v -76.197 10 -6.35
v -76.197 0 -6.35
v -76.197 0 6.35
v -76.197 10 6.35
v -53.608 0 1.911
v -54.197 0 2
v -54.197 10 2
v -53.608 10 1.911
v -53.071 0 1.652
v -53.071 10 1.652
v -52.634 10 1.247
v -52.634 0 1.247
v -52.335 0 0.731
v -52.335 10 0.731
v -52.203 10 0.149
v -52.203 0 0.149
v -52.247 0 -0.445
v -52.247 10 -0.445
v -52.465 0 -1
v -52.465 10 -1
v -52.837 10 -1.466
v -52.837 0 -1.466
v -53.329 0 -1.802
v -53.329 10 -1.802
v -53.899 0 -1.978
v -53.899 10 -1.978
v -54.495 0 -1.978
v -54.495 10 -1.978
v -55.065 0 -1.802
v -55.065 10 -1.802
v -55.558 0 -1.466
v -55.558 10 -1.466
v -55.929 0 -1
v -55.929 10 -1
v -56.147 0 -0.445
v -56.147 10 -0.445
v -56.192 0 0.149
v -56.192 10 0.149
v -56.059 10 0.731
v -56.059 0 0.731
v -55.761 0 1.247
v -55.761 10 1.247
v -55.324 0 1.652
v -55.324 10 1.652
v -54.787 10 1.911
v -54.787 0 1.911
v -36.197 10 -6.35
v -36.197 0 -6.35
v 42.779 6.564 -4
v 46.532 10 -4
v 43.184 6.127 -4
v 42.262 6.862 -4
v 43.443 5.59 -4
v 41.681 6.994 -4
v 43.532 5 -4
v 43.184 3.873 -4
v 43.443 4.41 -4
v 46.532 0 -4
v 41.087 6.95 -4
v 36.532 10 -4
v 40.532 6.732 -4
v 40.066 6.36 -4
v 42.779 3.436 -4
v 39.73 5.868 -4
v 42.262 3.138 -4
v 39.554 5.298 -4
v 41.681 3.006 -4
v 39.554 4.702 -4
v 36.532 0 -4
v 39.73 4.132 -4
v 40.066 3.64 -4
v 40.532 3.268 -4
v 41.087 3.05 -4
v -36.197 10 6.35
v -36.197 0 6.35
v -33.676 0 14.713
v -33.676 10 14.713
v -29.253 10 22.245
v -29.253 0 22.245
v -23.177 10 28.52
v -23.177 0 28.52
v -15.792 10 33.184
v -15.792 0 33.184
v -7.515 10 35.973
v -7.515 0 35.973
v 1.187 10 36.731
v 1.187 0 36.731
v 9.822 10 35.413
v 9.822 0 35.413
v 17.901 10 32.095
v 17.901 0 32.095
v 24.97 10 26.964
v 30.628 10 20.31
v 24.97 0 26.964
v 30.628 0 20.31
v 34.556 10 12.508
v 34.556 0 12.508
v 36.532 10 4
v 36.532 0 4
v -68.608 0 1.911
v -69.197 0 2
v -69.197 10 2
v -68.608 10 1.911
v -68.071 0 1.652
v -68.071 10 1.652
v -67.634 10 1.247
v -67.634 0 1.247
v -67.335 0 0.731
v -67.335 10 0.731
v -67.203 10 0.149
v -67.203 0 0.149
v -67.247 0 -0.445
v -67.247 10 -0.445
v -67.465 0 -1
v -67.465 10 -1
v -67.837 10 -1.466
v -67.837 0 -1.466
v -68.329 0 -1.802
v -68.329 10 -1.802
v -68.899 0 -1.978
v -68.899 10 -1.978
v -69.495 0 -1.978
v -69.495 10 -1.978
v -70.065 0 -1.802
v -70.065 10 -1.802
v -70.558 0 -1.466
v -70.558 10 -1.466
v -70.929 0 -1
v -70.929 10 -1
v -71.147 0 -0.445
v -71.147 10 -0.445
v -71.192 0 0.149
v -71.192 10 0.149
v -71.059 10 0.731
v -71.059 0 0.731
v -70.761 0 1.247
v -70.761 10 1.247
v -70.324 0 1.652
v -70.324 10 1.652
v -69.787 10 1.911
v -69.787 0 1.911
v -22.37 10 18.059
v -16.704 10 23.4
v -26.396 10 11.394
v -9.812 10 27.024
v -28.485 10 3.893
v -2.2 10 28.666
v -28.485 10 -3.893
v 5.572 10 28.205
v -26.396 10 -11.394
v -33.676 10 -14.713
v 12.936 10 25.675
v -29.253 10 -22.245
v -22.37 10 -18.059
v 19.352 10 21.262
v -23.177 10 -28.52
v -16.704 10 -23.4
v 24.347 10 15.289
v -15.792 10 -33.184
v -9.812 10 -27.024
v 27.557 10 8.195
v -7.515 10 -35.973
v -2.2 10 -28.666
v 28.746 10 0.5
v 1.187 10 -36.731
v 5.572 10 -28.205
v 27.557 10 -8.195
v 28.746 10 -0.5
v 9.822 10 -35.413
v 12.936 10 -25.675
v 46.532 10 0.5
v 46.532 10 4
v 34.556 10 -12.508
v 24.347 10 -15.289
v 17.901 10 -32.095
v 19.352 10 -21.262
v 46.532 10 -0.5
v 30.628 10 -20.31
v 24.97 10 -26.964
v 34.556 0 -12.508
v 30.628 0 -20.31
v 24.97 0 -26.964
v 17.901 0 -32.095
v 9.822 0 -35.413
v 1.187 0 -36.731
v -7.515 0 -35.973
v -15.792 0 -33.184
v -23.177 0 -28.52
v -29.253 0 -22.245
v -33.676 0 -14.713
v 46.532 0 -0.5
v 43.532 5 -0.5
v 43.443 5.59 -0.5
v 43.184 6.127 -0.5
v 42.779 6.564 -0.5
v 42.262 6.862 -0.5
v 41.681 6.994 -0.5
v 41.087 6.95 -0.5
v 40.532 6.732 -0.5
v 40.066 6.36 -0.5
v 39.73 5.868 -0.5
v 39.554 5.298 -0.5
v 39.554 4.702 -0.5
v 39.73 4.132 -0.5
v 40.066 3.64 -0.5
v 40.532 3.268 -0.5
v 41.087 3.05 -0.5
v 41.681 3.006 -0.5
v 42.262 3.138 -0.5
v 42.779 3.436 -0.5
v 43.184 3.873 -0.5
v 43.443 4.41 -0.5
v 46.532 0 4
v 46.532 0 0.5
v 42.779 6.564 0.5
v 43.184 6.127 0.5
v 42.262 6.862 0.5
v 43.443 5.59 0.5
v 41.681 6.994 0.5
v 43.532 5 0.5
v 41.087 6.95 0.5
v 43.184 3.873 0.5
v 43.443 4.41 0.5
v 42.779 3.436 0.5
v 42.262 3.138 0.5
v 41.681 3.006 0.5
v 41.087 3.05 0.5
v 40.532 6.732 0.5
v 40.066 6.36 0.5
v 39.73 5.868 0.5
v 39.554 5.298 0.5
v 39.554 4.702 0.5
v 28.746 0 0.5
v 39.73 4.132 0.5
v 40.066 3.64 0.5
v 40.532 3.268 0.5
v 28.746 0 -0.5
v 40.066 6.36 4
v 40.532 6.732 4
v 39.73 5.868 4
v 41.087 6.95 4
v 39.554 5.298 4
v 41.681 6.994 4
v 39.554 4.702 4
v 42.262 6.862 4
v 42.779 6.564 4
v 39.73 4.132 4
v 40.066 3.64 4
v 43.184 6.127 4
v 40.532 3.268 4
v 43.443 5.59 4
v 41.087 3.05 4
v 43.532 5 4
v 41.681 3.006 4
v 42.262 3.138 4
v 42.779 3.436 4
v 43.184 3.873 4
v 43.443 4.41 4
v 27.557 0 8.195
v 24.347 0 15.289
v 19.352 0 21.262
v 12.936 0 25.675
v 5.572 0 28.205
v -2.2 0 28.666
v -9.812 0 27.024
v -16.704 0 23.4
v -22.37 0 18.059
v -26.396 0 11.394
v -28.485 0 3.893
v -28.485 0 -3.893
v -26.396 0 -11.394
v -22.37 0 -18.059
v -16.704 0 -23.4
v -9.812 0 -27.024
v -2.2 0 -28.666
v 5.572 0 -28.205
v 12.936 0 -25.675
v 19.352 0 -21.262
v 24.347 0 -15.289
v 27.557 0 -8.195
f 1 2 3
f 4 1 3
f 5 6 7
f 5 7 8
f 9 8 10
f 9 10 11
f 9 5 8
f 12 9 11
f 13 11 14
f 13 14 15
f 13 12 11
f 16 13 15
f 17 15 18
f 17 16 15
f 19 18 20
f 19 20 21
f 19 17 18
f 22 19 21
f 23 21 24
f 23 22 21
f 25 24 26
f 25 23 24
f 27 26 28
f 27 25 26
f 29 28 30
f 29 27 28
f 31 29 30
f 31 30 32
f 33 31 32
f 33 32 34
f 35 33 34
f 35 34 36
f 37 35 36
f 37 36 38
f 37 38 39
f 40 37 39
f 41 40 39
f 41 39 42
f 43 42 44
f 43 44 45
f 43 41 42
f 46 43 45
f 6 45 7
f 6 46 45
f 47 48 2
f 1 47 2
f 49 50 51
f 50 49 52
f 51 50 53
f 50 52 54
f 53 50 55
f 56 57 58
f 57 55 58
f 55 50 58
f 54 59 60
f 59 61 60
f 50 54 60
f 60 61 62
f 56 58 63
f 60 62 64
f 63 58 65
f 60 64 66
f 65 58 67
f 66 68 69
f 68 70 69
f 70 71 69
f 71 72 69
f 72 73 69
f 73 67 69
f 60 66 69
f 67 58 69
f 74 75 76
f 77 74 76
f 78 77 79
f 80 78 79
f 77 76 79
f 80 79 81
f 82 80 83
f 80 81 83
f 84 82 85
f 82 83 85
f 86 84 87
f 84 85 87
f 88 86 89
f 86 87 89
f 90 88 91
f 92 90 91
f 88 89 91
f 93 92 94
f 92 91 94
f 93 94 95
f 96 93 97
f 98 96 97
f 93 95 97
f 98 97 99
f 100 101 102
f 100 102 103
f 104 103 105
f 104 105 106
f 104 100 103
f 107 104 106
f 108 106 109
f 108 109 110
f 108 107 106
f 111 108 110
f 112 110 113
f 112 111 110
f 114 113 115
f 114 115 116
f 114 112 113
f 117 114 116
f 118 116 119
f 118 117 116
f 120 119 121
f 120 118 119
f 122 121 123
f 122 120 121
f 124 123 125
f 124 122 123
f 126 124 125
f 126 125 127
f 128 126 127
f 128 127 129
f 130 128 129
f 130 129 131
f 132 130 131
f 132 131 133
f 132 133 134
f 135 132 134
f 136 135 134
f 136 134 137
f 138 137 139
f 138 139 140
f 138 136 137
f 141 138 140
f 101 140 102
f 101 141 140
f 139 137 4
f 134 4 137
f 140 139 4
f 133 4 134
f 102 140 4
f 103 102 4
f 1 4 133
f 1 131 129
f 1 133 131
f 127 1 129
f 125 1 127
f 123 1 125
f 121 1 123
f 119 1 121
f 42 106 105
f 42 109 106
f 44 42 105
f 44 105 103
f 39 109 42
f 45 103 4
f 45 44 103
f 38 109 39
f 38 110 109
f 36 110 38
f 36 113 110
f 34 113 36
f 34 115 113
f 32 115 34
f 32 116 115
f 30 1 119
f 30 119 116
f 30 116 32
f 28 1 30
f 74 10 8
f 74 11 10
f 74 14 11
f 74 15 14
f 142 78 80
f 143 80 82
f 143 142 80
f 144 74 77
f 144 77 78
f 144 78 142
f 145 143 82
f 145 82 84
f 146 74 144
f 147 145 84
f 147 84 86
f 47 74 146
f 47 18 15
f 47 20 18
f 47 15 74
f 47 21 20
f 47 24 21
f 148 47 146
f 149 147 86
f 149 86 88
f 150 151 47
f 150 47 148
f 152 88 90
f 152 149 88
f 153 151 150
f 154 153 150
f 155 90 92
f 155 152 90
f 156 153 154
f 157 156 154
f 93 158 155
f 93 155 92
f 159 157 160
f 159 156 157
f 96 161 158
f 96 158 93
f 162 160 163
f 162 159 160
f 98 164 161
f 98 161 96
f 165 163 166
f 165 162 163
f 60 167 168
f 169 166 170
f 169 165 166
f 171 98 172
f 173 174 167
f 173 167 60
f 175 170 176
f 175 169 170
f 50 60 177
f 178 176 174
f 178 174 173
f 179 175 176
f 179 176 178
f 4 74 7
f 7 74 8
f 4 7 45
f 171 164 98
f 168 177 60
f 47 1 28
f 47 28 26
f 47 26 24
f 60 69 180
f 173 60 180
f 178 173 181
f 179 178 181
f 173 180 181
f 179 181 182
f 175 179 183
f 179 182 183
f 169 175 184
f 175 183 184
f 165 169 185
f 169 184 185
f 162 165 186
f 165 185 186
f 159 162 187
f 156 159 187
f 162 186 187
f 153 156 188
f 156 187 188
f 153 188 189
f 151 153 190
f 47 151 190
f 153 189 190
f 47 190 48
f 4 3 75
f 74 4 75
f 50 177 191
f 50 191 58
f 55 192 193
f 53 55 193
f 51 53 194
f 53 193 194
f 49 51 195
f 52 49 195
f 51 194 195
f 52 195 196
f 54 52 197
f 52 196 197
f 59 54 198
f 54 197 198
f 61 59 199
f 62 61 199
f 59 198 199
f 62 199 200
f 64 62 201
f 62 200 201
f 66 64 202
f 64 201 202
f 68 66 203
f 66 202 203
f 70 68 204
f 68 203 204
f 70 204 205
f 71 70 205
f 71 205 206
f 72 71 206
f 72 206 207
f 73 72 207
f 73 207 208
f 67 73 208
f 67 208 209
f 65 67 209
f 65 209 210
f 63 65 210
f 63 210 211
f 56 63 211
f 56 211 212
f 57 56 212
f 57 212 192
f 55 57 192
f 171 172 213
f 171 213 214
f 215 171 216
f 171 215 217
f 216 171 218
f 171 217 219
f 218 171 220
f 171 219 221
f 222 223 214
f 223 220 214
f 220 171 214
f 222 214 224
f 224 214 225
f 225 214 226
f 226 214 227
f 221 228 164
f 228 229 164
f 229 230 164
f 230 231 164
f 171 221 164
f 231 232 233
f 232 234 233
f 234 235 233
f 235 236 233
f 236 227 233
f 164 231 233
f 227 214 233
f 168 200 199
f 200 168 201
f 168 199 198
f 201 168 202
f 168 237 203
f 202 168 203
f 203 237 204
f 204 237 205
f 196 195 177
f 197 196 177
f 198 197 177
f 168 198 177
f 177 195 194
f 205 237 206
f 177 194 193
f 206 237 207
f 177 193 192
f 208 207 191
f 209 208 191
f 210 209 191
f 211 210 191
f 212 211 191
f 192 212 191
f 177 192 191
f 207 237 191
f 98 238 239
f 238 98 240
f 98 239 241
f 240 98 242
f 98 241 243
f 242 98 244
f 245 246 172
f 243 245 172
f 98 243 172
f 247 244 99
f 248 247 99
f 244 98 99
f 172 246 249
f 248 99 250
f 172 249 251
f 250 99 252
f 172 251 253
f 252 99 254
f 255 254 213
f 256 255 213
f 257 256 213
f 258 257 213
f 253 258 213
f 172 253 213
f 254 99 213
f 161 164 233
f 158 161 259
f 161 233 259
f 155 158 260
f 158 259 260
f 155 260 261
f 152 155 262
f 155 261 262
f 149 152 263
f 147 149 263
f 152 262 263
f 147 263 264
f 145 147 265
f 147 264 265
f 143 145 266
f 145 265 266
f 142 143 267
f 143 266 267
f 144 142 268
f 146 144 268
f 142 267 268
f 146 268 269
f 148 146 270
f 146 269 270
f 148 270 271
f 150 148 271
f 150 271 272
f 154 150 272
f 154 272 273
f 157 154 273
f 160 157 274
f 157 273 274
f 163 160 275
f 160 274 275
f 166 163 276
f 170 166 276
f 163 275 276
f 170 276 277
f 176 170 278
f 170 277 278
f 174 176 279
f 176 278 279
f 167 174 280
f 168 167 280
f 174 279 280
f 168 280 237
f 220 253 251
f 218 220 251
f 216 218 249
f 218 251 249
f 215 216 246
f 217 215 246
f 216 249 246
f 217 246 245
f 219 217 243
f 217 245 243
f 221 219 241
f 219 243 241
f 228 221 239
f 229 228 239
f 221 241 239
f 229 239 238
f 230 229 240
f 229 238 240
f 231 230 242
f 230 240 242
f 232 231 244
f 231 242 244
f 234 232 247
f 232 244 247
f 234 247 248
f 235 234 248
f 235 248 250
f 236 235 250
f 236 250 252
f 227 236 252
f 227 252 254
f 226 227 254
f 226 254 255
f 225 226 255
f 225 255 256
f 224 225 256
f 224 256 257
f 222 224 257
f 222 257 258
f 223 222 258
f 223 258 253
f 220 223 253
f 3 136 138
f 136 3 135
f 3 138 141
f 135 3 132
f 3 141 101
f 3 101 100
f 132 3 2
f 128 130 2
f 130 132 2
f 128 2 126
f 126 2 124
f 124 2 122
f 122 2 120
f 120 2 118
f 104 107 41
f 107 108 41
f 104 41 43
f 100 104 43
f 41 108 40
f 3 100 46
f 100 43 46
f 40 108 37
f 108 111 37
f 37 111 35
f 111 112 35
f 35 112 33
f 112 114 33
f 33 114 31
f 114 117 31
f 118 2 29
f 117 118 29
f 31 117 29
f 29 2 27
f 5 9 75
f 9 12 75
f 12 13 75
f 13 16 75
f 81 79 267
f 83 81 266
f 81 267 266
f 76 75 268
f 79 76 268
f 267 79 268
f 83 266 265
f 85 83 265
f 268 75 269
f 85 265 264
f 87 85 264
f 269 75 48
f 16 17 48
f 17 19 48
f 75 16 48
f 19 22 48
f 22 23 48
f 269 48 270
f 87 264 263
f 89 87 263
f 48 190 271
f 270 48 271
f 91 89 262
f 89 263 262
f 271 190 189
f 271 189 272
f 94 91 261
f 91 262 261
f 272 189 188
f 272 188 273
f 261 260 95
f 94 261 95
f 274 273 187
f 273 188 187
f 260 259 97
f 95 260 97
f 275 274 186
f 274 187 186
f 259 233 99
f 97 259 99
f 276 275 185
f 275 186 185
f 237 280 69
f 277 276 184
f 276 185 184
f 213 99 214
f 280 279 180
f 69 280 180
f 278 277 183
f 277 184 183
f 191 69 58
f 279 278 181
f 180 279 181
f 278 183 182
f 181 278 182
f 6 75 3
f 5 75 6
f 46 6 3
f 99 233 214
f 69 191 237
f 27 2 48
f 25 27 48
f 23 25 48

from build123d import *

# Parameters (mm, degrees)
SKETCH1_R           = 2
BOSS_EXTRUDE2_DEPTH = 10
SKETCH2_R           = 2
CUT_EXTRUDE1_DEPTH  = 87.986099448


with BuildPart() as part:
    # Sketch1 → Boss-Extrude2 (new body)
    with BuildSketch(Plane(origin=(0, 0, 0), x_dir=(1, 0, 0), z_dir=(0, 1, 0))):
        with BuildLine():
            Line((-76.197237464, -6.35), (-36.197237464, -6.35))
            ThreePointArc((-36.197237464, -6.35), (1.186838378, -36.730830574), (36.531664348, -4))
            Line((36.531664348, -4), (46.531664348, -4))
            Line((46.531664348, -4), (46.531664348, -0.5))
            Line((46.531664348, -0.5), (28.745651845, -0.5))
            ThreePointArc((28.745651845, -0.5), (-28.75, 0), (28.745651845, 0.5))
            Line((28.745651845, 0.5), (46.531664348, 0.5))
            Line((46.531664348, 0.5), (46.531664348, 4))
            Line((46.531664348, 4), (36.531664348, 4))
            ThreePointArc((36.531664348, 4), (1.186838378, 36.730830574), (-36.197237464, 6.35))
            Line((-36.197237464, 6.35), (-76.197237464, 6.35))
            Line((-76.197237464, 6.35), (-76.197237464, -6.35))
        make_face()
        with Locations(Location((-69.197237464, 0, 0), (0, 0, 270))):
            Circle(SKETCH1_R, mode=Mode.SUBTRACT)
        with Locations(Location((-54.197237464, 0, 0), (0, 0, 270))):
            Circle(SKETCH1_R, mode=Mode.SUBTRACT)
    extrude(amount=BOSS_EXTRUDE2_DEPTH)

    # Sketch2 → Cut-Extrude1 (cut, through all)
    with BuildSketch(Plane.XY.offset(4)):
        with Locations((41.531664348, 5)):
            Circle(SKETCH2_R)
    extrude(amount=-CUT_EXTRUDE1_DEPTH, mode=Mode.SUBTRACT)


solid = part.part
